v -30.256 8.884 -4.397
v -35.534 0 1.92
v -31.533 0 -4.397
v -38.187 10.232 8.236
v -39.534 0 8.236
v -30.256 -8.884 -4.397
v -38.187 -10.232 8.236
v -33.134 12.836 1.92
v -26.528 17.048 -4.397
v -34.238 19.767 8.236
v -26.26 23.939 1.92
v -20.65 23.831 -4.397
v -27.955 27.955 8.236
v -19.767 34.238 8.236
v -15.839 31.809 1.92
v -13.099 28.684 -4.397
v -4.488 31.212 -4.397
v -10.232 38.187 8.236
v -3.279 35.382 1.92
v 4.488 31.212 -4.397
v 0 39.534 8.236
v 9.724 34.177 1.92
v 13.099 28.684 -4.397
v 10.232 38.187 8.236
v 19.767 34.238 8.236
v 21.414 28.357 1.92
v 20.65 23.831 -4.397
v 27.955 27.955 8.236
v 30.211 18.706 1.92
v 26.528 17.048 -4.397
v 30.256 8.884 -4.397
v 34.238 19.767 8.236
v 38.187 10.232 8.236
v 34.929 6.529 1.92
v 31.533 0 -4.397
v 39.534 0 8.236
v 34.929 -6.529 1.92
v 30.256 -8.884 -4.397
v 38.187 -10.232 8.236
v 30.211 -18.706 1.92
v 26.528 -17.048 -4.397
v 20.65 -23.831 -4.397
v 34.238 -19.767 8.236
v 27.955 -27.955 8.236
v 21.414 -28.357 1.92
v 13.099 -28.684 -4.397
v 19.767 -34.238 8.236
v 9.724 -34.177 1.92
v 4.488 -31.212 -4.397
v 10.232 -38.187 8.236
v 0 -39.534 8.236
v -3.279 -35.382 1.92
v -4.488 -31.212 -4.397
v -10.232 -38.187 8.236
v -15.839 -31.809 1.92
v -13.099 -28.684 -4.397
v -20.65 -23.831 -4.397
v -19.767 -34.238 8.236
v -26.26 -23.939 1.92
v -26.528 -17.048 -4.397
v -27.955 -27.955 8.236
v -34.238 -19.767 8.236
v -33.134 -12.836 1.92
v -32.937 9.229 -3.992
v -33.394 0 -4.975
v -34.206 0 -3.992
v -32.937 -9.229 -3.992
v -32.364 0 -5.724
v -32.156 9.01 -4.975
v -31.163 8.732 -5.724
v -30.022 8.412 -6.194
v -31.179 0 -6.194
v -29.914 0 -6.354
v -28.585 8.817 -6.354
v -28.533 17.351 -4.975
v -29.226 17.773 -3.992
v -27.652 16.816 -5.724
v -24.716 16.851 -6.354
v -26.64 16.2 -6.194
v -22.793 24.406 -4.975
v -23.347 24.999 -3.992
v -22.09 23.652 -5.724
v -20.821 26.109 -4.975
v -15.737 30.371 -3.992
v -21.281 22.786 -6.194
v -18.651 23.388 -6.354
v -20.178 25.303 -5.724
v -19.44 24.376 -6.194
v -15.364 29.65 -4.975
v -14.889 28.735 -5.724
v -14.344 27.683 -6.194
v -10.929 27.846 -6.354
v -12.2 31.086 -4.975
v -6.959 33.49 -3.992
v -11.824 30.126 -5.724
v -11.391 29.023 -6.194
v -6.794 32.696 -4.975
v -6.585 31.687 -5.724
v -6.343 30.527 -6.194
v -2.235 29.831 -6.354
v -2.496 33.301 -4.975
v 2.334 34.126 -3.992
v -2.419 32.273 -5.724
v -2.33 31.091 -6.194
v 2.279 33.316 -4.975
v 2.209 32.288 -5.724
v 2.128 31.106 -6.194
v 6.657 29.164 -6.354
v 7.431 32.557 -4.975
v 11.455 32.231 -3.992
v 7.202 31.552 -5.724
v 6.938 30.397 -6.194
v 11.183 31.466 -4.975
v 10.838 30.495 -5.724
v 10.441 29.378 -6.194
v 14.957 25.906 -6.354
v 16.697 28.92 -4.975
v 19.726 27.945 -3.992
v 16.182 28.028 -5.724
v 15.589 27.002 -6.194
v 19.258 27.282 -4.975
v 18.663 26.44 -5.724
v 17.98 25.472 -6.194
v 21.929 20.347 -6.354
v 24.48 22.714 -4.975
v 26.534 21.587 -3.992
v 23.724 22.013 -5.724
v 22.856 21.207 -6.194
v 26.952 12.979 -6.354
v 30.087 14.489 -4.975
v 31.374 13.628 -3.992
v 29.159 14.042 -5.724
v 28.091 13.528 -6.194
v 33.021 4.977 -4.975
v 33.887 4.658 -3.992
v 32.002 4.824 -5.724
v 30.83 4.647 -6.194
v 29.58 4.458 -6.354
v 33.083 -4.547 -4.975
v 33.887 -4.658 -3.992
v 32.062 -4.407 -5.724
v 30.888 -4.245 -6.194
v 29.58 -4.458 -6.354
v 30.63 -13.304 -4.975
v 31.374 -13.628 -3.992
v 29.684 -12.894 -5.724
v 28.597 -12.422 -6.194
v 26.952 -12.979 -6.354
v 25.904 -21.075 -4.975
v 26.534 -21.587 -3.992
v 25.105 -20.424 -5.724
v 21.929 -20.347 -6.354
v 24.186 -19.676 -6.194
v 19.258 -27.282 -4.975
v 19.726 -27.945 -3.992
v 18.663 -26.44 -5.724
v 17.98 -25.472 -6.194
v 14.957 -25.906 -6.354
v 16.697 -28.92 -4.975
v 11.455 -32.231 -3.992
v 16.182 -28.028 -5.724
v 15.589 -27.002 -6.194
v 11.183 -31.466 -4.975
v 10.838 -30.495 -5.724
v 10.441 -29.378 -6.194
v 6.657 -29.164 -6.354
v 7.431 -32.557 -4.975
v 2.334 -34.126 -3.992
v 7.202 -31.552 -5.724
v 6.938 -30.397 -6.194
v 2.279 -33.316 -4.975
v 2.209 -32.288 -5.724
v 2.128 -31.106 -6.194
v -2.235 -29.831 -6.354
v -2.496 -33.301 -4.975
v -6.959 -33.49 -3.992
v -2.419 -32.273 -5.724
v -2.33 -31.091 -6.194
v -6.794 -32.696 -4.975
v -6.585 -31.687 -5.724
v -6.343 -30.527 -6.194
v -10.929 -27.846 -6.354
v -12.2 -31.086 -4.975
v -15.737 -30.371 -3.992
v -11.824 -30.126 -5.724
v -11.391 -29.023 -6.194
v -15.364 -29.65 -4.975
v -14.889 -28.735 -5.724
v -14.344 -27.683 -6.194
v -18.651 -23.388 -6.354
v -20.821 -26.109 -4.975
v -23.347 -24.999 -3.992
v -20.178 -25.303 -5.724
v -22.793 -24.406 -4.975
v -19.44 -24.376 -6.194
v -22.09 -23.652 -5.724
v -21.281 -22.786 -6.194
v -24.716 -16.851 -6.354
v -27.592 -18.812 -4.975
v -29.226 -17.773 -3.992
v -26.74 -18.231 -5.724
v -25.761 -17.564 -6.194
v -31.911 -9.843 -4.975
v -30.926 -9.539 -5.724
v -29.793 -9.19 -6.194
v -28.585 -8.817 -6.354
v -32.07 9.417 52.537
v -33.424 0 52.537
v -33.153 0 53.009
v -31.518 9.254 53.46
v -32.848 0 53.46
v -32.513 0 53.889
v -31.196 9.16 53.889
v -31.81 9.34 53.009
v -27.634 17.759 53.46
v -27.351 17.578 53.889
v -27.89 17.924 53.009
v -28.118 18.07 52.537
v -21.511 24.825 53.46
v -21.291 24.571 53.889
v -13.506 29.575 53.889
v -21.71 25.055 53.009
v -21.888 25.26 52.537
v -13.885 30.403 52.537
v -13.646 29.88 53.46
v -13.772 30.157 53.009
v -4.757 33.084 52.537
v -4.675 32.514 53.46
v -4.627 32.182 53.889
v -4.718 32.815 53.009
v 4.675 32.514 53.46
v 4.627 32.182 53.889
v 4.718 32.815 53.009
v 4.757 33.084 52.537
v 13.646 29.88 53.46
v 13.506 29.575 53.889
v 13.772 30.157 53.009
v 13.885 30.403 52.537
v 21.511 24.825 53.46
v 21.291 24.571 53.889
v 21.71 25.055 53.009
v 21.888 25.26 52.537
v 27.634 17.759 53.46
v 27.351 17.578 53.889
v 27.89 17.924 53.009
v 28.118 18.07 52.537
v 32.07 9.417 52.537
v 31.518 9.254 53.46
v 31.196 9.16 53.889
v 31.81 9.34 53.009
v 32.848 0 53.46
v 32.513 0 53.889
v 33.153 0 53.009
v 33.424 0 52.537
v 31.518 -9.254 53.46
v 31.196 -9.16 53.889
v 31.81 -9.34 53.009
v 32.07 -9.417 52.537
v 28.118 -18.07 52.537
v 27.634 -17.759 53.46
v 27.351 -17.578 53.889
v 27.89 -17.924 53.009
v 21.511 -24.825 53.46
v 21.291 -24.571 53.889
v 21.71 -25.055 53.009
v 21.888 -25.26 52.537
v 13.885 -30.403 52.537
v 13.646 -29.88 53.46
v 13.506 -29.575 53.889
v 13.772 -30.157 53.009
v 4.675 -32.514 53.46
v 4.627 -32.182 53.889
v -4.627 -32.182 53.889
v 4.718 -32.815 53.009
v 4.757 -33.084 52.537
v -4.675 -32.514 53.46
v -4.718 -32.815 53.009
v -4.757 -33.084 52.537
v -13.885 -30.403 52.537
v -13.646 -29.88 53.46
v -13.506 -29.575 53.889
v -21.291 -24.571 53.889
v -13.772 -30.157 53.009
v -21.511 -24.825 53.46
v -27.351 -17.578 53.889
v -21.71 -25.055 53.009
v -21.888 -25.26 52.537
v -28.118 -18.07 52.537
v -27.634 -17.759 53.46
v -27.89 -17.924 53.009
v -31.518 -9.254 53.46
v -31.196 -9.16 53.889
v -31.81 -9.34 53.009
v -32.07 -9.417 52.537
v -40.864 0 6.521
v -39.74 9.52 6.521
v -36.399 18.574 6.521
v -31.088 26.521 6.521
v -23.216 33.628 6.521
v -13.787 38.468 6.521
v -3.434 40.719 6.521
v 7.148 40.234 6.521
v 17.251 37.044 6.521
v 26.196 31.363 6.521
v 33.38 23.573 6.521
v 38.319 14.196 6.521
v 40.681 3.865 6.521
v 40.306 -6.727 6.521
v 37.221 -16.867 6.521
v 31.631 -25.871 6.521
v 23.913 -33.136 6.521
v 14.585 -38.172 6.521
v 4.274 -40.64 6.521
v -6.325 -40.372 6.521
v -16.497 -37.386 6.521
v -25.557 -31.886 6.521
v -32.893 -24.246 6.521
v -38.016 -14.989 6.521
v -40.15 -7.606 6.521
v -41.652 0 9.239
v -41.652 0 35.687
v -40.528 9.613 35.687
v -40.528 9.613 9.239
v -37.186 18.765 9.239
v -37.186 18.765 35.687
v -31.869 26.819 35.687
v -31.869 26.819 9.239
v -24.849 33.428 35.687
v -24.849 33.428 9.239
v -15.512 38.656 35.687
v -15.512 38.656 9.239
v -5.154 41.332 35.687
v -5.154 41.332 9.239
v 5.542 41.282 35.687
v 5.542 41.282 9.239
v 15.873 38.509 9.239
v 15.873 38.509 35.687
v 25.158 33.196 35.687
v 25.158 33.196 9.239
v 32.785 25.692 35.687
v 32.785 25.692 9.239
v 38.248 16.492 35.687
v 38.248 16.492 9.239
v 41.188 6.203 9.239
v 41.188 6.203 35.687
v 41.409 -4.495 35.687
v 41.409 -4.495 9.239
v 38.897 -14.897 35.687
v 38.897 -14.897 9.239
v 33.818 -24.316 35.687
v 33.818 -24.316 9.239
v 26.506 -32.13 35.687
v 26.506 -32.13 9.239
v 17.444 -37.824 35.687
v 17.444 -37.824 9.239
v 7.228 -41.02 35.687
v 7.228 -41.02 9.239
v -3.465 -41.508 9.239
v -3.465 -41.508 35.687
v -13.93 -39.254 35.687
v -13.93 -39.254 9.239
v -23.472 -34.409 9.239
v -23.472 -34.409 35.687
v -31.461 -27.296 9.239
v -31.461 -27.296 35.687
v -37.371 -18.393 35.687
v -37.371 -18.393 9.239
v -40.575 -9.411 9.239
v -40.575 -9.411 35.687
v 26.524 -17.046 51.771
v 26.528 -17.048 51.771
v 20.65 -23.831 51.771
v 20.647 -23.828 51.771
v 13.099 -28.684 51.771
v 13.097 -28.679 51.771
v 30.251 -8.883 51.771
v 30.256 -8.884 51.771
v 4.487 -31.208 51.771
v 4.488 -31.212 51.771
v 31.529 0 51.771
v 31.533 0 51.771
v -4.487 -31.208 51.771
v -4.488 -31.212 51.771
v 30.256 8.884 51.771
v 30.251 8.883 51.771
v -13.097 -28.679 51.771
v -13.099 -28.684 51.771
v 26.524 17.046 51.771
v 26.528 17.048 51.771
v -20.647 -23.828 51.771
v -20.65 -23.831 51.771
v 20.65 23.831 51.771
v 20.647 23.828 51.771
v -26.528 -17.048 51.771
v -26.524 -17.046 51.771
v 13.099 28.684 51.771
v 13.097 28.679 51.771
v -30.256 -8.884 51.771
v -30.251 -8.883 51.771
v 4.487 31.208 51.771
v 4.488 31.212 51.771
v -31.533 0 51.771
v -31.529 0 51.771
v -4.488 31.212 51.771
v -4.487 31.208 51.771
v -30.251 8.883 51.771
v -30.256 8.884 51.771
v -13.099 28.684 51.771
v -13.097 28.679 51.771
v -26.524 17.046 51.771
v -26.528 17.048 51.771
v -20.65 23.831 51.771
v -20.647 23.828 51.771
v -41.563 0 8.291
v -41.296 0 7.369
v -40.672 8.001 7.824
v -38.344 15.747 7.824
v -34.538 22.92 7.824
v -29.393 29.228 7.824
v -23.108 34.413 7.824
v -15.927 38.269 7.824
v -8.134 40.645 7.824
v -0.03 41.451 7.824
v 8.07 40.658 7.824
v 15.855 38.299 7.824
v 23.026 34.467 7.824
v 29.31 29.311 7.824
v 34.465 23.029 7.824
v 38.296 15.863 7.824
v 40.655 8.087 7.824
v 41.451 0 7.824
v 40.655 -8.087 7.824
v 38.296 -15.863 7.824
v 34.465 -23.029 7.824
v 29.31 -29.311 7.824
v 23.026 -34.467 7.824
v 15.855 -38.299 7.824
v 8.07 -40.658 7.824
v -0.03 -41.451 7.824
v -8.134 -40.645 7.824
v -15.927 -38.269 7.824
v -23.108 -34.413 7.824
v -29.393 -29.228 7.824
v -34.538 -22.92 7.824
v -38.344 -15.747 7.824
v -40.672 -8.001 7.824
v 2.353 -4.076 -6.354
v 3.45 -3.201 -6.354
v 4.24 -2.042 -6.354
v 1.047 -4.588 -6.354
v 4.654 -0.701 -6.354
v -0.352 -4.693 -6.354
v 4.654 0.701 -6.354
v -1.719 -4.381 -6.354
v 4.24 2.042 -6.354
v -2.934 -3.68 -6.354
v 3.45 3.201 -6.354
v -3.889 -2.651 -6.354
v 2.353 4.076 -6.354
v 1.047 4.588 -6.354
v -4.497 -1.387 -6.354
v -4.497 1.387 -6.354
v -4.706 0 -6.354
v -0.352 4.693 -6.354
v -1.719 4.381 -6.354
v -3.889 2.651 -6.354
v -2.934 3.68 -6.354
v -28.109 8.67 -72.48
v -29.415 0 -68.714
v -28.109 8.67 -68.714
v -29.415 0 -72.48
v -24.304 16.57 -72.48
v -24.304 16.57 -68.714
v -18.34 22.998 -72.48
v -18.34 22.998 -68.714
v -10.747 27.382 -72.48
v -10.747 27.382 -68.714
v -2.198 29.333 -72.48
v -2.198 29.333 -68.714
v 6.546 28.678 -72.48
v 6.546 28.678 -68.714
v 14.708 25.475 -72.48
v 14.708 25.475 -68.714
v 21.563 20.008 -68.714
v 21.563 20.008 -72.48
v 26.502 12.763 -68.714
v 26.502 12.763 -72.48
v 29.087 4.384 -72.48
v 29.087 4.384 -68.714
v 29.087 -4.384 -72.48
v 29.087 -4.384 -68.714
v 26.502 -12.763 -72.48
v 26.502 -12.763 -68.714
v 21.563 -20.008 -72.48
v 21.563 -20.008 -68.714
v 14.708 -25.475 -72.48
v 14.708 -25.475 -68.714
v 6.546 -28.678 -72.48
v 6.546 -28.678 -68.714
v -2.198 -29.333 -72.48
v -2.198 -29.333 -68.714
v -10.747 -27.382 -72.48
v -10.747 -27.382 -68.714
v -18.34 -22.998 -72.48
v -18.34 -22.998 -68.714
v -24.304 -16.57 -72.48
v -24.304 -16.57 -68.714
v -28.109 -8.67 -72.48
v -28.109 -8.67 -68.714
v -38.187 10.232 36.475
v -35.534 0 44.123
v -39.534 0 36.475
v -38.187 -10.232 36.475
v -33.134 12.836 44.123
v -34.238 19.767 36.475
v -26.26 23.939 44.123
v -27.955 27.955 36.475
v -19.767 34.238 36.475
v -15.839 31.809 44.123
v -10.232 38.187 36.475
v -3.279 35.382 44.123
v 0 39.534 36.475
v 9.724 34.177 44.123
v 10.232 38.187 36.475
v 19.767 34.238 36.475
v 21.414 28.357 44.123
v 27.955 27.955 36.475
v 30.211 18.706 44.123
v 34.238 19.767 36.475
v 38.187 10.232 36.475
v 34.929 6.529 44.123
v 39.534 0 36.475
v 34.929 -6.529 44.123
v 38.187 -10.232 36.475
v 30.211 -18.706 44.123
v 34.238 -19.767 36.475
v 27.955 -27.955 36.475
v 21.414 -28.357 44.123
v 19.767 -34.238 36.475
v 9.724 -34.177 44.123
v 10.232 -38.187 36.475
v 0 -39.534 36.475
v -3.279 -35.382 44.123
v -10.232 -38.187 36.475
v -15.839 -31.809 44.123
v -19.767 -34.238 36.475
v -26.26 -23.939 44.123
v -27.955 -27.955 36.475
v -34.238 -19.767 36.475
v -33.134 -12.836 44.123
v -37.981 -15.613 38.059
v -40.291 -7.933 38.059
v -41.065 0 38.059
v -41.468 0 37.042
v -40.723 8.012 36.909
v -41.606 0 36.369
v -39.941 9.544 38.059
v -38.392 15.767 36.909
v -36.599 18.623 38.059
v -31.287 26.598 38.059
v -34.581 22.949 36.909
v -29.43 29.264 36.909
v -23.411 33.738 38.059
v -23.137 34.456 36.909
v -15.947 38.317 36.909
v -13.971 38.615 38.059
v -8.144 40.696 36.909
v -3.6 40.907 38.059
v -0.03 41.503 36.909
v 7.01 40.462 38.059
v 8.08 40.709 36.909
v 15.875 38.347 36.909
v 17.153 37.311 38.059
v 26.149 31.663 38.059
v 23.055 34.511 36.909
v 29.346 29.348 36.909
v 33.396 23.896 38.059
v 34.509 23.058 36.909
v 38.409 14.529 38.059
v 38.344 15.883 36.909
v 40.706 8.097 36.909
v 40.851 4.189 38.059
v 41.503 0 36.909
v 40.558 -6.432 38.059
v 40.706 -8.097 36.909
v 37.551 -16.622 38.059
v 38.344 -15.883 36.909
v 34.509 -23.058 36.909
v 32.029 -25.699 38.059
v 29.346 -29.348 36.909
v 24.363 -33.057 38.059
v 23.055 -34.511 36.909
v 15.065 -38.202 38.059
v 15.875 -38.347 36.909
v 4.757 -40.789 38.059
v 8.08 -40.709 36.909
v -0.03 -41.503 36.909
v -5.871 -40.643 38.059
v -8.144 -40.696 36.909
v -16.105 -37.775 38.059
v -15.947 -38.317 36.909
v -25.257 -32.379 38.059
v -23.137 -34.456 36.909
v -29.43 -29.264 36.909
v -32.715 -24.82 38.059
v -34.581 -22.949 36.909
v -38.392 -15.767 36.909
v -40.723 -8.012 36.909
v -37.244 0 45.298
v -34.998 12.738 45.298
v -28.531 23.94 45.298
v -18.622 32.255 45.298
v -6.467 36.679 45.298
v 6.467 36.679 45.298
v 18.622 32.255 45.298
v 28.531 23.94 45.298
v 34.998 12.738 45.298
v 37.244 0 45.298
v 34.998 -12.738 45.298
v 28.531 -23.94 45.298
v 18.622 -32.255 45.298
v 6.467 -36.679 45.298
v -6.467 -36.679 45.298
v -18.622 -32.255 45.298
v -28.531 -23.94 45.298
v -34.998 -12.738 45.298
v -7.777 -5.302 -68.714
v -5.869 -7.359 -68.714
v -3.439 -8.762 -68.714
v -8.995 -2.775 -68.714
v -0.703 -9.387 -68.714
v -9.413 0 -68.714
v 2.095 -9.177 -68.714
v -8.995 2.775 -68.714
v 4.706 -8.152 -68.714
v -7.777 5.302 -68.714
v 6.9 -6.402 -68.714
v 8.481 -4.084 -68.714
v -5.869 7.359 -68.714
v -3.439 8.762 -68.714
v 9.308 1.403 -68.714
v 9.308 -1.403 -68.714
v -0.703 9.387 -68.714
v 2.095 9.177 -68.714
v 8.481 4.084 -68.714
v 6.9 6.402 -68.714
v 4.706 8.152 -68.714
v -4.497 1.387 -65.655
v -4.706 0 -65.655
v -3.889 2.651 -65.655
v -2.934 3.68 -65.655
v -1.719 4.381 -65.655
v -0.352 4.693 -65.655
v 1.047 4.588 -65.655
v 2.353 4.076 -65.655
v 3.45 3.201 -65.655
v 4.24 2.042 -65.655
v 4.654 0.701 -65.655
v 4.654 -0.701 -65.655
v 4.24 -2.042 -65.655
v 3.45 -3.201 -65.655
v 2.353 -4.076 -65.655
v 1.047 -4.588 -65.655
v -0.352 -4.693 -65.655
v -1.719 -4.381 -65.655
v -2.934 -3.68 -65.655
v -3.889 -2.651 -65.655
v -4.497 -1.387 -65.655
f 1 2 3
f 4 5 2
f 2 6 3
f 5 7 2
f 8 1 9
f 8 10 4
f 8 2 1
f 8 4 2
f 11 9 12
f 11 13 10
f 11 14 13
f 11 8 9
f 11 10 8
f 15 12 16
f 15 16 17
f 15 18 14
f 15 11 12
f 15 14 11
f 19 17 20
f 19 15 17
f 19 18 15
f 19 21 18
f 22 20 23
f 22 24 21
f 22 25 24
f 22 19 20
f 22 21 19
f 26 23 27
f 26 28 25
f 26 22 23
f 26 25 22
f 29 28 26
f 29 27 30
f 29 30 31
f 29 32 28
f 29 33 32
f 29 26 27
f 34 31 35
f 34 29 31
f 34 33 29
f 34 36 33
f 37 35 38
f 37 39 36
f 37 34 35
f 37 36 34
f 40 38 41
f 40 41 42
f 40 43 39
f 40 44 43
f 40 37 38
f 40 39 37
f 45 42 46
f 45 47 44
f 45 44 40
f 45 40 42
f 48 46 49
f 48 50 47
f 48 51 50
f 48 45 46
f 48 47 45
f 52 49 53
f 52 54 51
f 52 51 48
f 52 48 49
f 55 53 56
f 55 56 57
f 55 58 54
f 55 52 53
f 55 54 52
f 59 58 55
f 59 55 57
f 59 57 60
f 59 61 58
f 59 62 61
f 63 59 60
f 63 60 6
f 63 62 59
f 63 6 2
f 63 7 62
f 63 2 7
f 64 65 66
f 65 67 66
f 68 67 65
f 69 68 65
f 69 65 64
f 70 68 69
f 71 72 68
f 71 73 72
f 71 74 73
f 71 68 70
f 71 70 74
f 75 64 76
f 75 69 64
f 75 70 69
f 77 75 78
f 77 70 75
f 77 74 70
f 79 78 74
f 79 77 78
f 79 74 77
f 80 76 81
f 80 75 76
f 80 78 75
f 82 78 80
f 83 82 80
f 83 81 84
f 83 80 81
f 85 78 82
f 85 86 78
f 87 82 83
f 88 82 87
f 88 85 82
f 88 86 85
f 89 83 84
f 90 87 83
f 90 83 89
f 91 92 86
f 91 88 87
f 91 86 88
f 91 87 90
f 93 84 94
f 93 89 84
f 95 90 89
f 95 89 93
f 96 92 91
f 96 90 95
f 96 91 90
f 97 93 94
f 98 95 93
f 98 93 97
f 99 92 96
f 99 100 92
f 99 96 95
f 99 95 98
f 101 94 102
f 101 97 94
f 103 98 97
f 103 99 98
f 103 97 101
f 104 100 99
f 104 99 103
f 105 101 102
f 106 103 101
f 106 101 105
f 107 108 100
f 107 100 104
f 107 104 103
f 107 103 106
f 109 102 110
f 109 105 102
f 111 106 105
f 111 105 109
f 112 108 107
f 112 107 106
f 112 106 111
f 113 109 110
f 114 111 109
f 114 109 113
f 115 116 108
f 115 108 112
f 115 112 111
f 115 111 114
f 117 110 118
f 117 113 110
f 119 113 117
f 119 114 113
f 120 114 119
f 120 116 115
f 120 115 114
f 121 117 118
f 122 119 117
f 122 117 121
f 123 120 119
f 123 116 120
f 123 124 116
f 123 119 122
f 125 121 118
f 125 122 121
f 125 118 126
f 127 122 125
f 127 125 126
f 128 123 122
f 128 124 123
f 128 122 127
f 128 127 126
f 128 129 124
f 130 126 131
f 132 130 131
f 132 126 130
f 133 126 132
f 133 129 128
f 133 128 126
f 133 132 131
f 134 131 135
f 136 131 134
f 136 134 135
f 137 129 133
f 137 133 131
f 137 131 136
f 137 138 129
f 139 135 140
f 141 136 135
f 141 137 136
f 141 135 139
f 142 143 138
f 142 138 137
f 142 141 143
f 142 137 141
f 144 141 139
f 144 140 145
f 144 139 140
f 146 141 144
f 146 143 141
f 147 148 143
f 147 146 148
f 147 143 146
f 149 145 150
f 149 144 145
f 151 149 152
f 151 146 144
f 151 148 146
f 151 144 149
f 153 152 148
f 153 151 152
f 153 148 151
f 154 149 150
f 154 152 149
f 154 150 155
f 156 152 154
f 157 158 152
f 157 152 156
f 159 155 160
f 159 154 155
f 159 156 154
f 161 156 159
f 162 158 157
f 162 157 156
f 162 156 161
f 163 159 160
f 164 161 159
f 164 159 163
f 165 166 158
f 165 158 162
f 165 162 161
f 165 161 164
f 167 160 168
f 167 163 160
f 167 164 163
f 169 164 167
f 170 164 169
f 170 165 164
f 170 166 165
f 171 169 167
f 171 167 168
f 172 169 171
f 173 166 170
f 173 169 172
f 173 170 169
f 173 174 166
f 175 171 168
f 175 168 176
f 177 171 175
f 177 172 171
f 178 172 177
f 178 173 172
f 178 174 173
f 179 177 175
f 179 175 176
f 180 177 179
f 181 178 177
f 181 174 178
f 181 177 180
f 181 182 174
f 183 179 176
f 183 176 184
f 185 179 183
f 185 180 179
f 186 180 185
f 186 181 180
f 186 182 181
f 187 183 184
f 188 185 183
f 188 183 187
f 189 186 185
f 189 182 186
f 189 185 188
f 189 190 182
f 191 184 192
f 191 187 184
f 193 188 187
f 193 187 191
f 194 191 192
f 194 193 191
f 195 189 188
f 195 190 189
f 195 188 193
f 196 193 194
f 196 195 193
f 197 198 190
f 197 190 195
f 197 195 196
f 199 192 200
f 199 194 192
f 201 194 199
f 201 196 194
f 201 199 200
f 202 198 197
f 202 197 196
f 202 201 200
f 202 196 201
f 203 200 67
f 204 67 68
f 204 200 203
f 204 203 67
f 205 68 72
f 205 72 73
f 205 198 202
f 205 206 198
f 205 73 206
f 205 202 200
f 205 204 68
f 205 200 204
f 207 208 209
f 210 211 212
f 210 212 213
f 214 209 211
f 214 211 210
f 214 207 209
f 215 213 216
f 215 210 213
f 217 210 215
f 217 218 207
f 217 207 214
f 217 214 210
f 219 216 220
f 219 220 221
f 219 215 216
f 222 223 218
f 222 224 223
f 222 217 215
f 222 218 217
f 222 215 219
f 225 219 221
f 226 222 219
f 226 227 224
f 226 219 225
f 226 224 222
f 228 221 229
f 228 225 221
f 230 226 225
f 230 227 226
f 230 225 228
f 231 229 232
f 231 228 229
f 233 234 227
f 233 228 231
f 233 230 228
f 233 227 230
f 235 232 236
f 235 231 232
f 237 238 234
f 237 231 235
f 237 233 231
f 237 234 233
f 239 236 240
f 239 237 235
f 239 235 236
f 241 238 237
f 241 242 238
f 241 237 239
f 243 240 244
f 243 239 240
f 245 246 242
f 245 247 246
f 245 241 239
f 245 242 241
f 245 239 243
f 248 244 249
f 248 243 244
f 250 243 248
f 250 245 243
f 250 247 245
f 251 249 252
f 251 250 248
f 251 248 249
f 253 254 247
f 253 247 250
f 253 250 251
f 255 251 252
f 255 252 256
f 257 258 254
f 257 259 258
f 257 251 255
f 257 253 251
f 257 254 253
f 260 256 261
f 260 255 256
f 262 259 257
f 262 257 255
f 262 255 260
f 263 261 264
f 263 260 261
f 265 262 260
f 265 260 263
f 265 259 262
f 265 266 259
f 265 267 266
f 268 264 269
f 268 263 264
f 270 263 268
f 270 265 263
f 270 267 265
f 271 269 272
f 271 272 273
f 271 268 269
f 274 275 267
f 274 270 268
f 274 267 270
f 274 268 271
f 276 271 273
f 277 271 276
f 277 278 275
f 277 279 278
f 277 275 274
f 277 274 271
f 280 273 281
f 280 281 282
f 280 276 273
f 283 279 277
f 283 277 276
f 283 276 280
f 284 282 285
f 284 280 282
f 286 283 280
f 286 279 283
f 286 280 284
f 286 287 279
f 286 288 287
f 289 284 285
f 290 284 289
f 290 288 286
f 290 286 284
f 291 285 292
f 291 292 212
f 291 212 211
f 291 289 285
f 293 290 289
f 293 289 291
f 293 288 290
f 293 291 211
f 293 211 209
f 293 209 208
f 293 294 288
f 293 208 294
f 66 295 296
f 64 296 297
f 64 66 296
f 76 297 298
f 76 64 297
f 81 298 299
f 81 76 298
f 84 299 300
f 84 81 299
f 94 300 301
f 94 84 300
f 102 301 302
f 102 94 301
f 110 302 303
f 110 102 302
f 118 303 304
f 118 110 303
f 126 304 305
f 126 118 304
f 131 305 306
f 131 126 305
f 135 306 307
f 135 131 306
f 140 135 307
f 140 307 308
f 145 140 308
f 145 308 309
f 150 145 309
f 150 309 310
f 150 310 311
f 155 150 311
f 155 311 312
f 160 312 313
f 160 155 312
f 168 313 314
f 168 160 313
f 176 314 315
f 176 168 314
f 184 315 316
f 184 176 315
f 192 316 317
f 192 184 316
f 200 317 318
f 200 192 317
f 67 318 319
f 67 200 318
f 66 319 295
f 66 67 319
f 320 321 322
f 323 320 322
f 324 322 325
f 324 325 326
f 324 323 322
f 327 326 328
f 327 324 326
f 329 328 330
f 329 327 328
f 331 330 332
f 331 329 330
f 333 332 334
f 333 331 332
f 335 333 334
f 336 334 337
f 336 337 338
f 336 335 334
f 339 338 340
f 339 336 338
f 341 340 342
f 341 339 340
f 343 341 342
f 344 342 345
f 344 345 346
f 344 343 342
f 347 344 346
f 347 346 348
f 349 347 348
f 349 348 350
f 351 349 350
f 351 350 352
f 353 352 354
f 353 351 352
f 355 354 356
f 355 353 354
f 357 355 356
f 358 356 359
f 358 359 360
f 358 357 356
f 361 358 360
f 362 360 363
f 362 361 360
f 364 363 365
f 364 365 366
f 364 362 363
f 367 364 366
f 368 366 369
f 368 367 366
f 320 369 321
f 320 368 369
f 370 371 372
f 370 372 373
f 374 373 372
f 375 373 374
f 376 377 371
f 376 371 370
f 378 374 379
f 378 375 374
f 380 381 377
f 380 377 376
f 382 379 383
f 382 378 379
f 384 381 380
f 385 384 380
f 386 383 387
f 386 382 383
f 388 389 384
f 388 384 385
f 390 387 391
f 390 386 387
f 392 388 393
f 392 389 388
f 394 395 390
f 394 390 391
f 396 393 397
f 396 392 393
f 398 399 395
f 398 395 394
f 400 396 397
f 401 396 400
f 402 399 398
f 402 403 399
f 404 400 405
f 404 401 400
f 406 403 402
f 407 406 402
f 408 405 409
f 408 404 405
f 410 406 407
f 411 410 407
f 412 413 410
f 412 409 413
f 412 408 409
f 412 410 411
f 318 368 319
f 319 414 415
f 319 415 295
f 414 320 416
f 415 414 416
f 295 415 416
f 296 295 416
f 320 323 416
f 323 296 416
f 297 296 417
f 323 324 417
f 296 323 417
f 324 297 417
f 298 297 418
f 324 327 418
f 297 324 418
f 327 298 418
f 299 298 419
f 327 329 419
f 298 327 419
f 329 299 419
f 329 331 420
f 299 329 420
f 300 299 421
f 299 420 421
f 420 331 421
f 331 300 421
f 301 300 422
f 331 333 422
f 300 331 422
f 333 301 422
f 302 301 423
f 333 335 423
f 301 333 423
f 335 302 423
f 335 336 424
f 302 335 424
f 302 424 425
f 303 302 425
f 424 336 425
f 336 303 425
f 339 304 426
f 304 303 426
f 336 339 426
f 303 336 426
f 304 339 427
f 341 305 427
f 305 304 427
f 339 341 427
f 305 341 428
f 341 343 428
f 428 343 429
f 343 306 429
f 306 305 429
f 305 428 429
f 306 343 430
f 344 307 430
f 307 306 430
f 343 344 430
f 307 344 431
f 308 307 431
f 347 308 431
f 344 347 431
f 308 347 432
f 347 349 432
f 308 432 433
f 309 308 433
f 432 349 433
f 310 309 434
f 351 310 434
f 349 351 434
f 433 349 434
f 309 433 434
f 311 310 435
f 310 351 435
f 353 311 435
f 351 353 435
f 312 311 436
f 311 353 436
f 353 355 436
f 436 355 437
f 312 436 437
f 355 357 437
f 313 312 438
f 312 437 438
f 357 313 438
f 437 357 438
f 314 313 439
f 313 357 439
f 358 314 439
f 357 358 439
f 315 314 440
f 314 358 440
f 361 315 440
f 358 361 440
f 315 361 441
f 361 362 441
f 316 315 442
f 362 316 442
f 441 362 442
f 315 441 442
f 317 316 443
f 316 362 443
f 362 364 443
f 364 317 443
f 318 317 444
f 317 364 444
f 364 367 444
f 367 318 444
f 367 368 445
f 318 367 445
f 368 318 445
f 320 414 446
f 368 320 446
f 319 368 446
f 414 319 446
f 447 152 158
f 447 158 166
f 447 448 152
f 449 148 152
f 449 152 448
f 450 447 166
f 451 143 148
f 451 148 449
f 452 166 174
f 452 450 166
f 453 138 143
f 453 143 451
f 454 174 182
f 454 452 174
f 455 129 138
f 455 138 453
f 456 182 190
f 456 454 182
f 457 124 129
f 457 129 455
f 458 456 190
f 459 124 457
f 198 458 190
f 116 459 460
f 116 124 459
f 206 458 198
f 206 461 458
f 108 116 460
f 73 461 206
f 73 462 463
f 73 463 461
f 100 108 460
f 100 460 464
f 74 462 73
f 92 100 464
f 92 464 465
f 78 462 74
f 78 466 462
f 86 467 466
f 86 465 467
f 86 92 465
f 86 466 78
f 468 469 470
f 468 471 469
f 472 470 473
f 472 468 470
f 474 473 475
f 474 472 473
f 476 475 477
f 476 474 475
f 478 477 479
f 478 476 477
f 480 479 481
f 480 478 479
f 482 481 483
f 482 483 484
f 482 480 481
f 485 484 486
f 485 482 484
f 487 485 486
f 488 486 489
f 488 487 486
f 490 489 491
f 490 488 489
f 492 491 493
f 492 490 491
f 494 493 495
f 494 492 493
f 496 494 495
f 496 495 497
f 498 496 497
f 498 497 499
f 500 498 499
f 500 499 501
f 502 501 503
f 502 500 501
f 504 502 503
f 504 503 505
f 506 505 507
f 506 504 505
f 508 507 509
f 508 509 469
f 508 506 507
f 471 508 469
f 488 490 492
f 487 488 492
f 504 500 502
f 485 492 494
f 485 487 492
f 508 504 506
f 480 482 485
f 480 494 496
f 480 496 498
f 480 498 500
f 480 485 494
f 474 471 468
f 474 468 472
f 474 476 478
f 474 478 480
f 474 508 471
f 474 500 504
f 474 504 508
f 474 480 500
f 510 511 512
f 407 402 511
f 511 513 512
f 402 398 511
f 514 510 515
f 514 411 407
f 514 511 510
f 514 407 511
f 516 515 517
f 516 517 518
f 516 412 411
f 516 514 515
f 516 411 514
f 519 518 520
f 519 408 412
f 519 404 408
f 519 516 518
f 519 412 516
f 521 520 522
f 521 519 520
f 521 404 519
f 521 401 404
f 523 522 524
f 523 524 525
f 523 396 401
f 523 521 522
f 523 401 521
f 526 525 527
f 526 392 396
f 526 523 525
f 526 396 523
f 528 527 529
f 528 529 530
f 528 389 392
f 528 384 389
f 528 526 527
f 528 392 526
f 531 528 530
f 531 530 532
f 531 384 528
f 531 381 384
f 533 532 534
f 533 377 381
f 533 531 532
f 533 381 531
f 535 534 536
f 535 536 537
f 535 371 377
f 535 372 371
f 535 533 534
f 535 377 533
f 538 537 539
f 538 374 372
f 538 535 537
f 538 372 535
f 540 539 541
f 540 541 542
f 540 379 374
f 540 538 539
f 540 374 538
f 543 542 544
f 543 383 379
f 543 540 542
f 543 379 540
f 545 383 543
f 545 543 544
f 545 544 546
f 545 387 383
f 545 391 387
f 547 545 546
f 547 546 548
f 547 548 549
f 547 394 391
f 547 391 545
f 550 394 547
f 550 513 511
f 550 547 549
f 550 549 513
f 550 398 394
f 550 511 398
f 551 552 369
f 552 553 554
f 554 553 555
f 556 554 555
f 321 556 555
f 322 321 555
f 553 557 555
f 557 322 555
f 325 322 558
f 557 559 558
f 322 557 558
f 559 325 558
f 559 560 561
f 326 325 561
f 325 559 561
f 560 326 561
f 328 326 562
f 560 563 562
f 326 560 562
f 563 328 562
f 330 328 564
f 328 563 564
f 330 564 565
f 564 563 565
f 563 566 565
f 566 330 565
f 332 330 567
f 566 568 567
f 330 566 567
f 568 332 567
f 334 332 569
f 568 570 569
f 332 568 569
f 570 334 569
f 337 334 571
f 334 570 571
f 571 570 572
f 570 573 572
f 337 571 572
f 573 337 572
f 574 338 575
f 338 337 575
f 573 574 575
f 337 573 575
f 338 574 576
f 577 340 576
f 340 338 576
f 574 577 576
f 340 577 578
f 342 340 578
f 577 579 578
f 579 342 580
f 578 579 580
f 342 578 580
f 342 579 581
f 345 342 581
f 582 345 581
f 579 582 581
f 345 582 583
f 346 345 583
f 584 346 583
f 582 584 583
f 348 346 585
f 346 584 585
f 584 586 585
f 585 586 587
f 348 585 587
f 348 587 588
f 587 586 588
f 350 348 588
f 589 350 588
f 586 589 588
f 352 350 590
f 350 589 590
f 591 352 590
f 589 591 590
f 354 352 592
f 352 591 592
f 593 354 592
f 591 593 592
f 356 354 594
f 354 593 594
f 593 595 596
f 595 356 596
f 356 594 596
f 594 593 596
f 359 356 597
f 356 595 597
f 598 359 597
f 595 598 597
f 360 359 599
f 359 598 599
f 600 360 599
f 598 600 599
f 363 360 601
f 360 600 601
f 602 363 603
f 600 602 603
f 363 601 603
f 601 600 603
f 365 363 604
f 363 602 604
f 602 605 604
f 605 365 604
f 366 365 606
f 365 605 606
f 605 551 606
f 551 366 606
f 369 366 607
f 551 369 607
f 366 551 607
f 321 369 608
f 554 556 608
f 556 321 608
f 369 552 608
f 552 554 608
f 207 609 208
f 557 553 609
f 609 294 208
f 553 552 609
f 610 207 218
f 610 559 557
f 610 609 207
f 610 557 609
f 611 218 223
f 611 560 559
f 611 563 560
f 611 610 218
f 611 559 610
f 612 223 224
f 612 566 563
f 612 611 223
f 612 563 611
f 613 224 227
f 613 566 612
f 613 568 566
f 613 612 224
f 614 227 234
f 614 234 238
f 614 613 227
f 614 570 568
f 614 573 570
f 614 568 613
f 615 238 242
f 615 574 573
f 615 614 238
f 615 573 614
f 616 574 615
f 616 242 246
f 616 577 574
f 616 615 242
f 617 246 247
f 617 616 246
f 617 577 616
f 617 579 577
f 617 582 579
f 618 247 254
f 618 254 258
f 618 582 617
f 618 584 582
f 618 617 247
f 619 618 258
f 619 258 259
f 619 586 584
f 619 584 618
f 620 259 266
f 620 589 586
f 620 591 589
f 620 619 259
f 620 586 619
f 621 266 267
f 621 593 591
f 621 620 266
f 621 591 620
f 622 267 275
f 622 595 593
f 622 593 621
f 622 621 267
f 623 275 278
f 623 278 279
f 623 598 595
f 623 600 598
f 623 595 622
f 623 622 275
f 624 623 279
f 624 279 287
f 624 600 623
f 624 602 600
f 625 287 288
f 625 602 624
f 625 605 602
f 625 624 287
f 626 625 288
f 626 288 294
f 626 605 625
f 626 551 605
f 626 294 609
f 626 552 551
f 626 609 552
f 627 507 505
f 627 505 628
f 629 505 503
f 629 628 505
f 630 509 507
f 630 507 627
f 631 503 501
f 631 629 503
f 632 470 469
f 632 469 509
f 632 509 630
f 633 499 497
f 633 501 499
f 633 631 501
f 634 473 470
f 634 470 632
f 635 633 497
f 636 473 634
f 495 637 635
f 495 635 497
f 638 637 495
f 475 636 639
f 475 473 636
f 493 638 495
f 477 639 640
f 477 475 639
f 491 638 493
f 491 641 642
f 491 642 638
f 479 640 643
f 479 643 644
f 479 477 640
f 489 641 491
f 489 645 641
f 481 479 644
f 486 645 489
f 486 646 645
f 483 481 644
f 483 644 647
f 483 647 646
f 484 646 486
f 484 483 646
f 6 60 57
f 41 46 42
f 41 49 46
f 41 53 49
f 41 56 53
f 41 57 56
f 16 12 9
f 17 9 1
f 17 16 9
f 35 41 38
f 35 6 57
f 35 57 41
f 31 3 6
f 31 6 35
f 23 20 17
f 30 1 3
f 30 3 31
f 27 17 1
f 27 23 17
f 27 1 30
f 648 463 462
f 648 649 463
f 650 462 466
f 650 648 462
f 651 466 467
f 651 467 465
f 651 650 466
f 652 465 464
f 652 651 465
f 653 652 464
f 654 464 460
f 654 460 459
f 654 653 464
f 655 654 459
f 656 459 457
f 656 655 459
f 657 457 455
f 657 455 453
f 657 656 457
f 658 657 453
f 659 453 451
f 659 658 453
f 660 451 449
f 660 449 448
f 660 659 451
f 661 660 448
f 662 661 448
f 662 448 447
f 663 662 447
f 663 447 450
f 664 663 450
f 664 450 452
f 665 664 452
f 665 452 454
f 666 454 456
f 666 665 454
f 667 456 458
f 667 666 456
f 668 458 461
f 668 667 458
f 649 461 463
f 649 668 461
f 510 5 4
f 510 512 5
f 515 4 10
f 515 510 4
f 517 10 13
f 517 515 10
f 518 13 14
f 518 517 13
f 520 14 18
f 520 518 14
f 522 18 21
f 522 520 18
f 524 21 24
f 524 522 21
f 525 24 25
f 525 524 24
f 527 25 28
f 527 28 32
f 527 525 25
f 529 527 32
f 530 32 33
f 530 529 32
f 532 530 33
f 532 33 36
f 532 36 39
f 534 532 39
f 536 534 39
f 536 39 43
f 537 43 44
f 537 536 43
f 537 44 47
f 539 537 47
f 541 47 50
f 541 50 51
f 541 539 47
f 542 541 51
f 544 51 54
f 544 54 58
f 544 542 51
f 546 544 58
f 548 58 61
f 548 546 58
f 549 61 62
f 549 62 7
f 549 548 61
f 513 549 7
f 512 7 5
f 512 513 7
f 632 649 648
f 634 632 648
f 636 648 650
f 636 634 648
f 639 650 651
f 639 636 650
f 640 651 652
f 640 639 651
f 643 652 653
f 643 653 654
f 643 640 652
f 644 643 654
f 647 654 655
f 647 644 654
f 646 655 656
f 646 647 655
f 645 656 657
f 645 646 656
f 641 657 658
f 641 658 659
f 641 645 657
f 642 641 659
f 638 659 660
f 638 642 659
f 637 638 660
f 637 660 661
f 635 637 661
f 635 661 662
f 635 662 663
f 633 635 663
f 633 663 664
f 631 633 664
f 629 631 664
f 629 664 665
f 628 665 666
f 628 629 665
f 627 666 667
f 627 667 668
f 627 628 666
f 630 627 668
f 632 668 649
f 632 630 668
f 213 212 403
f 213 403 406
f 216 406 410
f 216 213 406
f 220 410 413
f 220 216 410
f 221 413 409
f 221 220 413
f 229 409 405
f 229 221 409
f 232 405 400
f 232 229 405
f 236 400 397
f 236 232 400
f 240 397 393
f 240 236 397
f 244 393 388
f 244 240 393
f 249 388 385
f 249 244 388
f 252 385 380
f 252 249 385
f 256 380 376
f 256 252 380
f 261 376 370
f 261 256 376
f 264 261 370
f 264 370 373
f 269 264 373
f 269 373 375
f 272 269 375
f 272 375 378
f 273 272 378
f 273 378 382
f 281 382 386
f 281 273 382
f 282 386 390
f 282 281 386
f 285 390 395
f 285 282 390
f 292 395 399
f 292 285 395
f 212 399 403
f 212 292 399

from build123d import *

# Parameters (mm, degrees)
F3_R = 5.08
F4_R = 5.08
F5_R = 5.08


# Not quite as in the source:
# - a fillet or chamfer that OpenCascade refuses, or shapes differently, is made with other operations: its cross-section is extruded or revolved along the edge and cut away or added


with BuildPart() as f1:
    # F0 (on Front) → F1 (revolve)
    with BuildSketch(Plane.XZ):
        Polygon((-31.5286010422, 51.7711788416), (-32.5126800885, 53.8890883327), (-32.7099710703, 53.8890883327), (-41.6522659361, 36.9457937777), (-41.6522659361, 7.7656768262), (-32.7099710703, -6.3537354581), (-12.7074699849, -6.3537354581), (-4.7064702958, -6.3537354581), (-4.7064702958, -65.6552687287), (-9.4129405916, -68.7144696712), (-29.415441677, -68.7144696712), (-29.415441677, -72.4796503782), (0, -72.4796503782), (0, -4.3968333285), (-12.472147122, -4.3968333285), (-31.5333530307, -4.3968333285), (-39.5343527198, 8.2363234833), (-39.5343527198, 36.475148052), (-31.5333530307, 51.7711788416), align=None)
    revolve(axis=Axis((0, 0, -0.3529824317), (0, 0, -1)))

    # F2: fillet of radius 7.62 on 1 edges, made by hand

    # F2_s1 → F2_t2 (revolve, cut)
    with BuildSketch(Plane.XZ):
        with BuildLine():
            ThreePointArc((-32.5126800885, 53.8890883327), (-33.0044959985, 53.2373184877), (-33.4237493814, 52.5366663478))
            Line((-33.4237493814, 52.5366663478), (-32.7099710703, 53.8890883327))
            Line((-32.7099710703, 53.8890883327), (-32.5126800885, 53.8890883327))
        make_face()
    revolve(axis=Axis((0, 0, 53.8890883327), (0, 0, -1)), mode=Mode.SUBTRACT)

    # F3
    f3_edges = [f1.edges().sort_by_distance(p)[0] for p in [
        (41.652266, 0, 36.945794),
    ]]
    fillet(f3_edges, radius=F3_R)

    # F4
    f4_edges = [f1.edges().sort_by_distance(p)[0] for p in [
        (41.652266, 0, 7.765677),
    ]]
    fillet(f4_edges, radius=F4_R)

    # F5
    f5_edges = [f1.edges().sort_by_distance(p)[0] for p in [
        (32.709971, 0, -6.353735),
    ]]
    fillet(f5_edges, radius=F5_R)


solid = f1.part
